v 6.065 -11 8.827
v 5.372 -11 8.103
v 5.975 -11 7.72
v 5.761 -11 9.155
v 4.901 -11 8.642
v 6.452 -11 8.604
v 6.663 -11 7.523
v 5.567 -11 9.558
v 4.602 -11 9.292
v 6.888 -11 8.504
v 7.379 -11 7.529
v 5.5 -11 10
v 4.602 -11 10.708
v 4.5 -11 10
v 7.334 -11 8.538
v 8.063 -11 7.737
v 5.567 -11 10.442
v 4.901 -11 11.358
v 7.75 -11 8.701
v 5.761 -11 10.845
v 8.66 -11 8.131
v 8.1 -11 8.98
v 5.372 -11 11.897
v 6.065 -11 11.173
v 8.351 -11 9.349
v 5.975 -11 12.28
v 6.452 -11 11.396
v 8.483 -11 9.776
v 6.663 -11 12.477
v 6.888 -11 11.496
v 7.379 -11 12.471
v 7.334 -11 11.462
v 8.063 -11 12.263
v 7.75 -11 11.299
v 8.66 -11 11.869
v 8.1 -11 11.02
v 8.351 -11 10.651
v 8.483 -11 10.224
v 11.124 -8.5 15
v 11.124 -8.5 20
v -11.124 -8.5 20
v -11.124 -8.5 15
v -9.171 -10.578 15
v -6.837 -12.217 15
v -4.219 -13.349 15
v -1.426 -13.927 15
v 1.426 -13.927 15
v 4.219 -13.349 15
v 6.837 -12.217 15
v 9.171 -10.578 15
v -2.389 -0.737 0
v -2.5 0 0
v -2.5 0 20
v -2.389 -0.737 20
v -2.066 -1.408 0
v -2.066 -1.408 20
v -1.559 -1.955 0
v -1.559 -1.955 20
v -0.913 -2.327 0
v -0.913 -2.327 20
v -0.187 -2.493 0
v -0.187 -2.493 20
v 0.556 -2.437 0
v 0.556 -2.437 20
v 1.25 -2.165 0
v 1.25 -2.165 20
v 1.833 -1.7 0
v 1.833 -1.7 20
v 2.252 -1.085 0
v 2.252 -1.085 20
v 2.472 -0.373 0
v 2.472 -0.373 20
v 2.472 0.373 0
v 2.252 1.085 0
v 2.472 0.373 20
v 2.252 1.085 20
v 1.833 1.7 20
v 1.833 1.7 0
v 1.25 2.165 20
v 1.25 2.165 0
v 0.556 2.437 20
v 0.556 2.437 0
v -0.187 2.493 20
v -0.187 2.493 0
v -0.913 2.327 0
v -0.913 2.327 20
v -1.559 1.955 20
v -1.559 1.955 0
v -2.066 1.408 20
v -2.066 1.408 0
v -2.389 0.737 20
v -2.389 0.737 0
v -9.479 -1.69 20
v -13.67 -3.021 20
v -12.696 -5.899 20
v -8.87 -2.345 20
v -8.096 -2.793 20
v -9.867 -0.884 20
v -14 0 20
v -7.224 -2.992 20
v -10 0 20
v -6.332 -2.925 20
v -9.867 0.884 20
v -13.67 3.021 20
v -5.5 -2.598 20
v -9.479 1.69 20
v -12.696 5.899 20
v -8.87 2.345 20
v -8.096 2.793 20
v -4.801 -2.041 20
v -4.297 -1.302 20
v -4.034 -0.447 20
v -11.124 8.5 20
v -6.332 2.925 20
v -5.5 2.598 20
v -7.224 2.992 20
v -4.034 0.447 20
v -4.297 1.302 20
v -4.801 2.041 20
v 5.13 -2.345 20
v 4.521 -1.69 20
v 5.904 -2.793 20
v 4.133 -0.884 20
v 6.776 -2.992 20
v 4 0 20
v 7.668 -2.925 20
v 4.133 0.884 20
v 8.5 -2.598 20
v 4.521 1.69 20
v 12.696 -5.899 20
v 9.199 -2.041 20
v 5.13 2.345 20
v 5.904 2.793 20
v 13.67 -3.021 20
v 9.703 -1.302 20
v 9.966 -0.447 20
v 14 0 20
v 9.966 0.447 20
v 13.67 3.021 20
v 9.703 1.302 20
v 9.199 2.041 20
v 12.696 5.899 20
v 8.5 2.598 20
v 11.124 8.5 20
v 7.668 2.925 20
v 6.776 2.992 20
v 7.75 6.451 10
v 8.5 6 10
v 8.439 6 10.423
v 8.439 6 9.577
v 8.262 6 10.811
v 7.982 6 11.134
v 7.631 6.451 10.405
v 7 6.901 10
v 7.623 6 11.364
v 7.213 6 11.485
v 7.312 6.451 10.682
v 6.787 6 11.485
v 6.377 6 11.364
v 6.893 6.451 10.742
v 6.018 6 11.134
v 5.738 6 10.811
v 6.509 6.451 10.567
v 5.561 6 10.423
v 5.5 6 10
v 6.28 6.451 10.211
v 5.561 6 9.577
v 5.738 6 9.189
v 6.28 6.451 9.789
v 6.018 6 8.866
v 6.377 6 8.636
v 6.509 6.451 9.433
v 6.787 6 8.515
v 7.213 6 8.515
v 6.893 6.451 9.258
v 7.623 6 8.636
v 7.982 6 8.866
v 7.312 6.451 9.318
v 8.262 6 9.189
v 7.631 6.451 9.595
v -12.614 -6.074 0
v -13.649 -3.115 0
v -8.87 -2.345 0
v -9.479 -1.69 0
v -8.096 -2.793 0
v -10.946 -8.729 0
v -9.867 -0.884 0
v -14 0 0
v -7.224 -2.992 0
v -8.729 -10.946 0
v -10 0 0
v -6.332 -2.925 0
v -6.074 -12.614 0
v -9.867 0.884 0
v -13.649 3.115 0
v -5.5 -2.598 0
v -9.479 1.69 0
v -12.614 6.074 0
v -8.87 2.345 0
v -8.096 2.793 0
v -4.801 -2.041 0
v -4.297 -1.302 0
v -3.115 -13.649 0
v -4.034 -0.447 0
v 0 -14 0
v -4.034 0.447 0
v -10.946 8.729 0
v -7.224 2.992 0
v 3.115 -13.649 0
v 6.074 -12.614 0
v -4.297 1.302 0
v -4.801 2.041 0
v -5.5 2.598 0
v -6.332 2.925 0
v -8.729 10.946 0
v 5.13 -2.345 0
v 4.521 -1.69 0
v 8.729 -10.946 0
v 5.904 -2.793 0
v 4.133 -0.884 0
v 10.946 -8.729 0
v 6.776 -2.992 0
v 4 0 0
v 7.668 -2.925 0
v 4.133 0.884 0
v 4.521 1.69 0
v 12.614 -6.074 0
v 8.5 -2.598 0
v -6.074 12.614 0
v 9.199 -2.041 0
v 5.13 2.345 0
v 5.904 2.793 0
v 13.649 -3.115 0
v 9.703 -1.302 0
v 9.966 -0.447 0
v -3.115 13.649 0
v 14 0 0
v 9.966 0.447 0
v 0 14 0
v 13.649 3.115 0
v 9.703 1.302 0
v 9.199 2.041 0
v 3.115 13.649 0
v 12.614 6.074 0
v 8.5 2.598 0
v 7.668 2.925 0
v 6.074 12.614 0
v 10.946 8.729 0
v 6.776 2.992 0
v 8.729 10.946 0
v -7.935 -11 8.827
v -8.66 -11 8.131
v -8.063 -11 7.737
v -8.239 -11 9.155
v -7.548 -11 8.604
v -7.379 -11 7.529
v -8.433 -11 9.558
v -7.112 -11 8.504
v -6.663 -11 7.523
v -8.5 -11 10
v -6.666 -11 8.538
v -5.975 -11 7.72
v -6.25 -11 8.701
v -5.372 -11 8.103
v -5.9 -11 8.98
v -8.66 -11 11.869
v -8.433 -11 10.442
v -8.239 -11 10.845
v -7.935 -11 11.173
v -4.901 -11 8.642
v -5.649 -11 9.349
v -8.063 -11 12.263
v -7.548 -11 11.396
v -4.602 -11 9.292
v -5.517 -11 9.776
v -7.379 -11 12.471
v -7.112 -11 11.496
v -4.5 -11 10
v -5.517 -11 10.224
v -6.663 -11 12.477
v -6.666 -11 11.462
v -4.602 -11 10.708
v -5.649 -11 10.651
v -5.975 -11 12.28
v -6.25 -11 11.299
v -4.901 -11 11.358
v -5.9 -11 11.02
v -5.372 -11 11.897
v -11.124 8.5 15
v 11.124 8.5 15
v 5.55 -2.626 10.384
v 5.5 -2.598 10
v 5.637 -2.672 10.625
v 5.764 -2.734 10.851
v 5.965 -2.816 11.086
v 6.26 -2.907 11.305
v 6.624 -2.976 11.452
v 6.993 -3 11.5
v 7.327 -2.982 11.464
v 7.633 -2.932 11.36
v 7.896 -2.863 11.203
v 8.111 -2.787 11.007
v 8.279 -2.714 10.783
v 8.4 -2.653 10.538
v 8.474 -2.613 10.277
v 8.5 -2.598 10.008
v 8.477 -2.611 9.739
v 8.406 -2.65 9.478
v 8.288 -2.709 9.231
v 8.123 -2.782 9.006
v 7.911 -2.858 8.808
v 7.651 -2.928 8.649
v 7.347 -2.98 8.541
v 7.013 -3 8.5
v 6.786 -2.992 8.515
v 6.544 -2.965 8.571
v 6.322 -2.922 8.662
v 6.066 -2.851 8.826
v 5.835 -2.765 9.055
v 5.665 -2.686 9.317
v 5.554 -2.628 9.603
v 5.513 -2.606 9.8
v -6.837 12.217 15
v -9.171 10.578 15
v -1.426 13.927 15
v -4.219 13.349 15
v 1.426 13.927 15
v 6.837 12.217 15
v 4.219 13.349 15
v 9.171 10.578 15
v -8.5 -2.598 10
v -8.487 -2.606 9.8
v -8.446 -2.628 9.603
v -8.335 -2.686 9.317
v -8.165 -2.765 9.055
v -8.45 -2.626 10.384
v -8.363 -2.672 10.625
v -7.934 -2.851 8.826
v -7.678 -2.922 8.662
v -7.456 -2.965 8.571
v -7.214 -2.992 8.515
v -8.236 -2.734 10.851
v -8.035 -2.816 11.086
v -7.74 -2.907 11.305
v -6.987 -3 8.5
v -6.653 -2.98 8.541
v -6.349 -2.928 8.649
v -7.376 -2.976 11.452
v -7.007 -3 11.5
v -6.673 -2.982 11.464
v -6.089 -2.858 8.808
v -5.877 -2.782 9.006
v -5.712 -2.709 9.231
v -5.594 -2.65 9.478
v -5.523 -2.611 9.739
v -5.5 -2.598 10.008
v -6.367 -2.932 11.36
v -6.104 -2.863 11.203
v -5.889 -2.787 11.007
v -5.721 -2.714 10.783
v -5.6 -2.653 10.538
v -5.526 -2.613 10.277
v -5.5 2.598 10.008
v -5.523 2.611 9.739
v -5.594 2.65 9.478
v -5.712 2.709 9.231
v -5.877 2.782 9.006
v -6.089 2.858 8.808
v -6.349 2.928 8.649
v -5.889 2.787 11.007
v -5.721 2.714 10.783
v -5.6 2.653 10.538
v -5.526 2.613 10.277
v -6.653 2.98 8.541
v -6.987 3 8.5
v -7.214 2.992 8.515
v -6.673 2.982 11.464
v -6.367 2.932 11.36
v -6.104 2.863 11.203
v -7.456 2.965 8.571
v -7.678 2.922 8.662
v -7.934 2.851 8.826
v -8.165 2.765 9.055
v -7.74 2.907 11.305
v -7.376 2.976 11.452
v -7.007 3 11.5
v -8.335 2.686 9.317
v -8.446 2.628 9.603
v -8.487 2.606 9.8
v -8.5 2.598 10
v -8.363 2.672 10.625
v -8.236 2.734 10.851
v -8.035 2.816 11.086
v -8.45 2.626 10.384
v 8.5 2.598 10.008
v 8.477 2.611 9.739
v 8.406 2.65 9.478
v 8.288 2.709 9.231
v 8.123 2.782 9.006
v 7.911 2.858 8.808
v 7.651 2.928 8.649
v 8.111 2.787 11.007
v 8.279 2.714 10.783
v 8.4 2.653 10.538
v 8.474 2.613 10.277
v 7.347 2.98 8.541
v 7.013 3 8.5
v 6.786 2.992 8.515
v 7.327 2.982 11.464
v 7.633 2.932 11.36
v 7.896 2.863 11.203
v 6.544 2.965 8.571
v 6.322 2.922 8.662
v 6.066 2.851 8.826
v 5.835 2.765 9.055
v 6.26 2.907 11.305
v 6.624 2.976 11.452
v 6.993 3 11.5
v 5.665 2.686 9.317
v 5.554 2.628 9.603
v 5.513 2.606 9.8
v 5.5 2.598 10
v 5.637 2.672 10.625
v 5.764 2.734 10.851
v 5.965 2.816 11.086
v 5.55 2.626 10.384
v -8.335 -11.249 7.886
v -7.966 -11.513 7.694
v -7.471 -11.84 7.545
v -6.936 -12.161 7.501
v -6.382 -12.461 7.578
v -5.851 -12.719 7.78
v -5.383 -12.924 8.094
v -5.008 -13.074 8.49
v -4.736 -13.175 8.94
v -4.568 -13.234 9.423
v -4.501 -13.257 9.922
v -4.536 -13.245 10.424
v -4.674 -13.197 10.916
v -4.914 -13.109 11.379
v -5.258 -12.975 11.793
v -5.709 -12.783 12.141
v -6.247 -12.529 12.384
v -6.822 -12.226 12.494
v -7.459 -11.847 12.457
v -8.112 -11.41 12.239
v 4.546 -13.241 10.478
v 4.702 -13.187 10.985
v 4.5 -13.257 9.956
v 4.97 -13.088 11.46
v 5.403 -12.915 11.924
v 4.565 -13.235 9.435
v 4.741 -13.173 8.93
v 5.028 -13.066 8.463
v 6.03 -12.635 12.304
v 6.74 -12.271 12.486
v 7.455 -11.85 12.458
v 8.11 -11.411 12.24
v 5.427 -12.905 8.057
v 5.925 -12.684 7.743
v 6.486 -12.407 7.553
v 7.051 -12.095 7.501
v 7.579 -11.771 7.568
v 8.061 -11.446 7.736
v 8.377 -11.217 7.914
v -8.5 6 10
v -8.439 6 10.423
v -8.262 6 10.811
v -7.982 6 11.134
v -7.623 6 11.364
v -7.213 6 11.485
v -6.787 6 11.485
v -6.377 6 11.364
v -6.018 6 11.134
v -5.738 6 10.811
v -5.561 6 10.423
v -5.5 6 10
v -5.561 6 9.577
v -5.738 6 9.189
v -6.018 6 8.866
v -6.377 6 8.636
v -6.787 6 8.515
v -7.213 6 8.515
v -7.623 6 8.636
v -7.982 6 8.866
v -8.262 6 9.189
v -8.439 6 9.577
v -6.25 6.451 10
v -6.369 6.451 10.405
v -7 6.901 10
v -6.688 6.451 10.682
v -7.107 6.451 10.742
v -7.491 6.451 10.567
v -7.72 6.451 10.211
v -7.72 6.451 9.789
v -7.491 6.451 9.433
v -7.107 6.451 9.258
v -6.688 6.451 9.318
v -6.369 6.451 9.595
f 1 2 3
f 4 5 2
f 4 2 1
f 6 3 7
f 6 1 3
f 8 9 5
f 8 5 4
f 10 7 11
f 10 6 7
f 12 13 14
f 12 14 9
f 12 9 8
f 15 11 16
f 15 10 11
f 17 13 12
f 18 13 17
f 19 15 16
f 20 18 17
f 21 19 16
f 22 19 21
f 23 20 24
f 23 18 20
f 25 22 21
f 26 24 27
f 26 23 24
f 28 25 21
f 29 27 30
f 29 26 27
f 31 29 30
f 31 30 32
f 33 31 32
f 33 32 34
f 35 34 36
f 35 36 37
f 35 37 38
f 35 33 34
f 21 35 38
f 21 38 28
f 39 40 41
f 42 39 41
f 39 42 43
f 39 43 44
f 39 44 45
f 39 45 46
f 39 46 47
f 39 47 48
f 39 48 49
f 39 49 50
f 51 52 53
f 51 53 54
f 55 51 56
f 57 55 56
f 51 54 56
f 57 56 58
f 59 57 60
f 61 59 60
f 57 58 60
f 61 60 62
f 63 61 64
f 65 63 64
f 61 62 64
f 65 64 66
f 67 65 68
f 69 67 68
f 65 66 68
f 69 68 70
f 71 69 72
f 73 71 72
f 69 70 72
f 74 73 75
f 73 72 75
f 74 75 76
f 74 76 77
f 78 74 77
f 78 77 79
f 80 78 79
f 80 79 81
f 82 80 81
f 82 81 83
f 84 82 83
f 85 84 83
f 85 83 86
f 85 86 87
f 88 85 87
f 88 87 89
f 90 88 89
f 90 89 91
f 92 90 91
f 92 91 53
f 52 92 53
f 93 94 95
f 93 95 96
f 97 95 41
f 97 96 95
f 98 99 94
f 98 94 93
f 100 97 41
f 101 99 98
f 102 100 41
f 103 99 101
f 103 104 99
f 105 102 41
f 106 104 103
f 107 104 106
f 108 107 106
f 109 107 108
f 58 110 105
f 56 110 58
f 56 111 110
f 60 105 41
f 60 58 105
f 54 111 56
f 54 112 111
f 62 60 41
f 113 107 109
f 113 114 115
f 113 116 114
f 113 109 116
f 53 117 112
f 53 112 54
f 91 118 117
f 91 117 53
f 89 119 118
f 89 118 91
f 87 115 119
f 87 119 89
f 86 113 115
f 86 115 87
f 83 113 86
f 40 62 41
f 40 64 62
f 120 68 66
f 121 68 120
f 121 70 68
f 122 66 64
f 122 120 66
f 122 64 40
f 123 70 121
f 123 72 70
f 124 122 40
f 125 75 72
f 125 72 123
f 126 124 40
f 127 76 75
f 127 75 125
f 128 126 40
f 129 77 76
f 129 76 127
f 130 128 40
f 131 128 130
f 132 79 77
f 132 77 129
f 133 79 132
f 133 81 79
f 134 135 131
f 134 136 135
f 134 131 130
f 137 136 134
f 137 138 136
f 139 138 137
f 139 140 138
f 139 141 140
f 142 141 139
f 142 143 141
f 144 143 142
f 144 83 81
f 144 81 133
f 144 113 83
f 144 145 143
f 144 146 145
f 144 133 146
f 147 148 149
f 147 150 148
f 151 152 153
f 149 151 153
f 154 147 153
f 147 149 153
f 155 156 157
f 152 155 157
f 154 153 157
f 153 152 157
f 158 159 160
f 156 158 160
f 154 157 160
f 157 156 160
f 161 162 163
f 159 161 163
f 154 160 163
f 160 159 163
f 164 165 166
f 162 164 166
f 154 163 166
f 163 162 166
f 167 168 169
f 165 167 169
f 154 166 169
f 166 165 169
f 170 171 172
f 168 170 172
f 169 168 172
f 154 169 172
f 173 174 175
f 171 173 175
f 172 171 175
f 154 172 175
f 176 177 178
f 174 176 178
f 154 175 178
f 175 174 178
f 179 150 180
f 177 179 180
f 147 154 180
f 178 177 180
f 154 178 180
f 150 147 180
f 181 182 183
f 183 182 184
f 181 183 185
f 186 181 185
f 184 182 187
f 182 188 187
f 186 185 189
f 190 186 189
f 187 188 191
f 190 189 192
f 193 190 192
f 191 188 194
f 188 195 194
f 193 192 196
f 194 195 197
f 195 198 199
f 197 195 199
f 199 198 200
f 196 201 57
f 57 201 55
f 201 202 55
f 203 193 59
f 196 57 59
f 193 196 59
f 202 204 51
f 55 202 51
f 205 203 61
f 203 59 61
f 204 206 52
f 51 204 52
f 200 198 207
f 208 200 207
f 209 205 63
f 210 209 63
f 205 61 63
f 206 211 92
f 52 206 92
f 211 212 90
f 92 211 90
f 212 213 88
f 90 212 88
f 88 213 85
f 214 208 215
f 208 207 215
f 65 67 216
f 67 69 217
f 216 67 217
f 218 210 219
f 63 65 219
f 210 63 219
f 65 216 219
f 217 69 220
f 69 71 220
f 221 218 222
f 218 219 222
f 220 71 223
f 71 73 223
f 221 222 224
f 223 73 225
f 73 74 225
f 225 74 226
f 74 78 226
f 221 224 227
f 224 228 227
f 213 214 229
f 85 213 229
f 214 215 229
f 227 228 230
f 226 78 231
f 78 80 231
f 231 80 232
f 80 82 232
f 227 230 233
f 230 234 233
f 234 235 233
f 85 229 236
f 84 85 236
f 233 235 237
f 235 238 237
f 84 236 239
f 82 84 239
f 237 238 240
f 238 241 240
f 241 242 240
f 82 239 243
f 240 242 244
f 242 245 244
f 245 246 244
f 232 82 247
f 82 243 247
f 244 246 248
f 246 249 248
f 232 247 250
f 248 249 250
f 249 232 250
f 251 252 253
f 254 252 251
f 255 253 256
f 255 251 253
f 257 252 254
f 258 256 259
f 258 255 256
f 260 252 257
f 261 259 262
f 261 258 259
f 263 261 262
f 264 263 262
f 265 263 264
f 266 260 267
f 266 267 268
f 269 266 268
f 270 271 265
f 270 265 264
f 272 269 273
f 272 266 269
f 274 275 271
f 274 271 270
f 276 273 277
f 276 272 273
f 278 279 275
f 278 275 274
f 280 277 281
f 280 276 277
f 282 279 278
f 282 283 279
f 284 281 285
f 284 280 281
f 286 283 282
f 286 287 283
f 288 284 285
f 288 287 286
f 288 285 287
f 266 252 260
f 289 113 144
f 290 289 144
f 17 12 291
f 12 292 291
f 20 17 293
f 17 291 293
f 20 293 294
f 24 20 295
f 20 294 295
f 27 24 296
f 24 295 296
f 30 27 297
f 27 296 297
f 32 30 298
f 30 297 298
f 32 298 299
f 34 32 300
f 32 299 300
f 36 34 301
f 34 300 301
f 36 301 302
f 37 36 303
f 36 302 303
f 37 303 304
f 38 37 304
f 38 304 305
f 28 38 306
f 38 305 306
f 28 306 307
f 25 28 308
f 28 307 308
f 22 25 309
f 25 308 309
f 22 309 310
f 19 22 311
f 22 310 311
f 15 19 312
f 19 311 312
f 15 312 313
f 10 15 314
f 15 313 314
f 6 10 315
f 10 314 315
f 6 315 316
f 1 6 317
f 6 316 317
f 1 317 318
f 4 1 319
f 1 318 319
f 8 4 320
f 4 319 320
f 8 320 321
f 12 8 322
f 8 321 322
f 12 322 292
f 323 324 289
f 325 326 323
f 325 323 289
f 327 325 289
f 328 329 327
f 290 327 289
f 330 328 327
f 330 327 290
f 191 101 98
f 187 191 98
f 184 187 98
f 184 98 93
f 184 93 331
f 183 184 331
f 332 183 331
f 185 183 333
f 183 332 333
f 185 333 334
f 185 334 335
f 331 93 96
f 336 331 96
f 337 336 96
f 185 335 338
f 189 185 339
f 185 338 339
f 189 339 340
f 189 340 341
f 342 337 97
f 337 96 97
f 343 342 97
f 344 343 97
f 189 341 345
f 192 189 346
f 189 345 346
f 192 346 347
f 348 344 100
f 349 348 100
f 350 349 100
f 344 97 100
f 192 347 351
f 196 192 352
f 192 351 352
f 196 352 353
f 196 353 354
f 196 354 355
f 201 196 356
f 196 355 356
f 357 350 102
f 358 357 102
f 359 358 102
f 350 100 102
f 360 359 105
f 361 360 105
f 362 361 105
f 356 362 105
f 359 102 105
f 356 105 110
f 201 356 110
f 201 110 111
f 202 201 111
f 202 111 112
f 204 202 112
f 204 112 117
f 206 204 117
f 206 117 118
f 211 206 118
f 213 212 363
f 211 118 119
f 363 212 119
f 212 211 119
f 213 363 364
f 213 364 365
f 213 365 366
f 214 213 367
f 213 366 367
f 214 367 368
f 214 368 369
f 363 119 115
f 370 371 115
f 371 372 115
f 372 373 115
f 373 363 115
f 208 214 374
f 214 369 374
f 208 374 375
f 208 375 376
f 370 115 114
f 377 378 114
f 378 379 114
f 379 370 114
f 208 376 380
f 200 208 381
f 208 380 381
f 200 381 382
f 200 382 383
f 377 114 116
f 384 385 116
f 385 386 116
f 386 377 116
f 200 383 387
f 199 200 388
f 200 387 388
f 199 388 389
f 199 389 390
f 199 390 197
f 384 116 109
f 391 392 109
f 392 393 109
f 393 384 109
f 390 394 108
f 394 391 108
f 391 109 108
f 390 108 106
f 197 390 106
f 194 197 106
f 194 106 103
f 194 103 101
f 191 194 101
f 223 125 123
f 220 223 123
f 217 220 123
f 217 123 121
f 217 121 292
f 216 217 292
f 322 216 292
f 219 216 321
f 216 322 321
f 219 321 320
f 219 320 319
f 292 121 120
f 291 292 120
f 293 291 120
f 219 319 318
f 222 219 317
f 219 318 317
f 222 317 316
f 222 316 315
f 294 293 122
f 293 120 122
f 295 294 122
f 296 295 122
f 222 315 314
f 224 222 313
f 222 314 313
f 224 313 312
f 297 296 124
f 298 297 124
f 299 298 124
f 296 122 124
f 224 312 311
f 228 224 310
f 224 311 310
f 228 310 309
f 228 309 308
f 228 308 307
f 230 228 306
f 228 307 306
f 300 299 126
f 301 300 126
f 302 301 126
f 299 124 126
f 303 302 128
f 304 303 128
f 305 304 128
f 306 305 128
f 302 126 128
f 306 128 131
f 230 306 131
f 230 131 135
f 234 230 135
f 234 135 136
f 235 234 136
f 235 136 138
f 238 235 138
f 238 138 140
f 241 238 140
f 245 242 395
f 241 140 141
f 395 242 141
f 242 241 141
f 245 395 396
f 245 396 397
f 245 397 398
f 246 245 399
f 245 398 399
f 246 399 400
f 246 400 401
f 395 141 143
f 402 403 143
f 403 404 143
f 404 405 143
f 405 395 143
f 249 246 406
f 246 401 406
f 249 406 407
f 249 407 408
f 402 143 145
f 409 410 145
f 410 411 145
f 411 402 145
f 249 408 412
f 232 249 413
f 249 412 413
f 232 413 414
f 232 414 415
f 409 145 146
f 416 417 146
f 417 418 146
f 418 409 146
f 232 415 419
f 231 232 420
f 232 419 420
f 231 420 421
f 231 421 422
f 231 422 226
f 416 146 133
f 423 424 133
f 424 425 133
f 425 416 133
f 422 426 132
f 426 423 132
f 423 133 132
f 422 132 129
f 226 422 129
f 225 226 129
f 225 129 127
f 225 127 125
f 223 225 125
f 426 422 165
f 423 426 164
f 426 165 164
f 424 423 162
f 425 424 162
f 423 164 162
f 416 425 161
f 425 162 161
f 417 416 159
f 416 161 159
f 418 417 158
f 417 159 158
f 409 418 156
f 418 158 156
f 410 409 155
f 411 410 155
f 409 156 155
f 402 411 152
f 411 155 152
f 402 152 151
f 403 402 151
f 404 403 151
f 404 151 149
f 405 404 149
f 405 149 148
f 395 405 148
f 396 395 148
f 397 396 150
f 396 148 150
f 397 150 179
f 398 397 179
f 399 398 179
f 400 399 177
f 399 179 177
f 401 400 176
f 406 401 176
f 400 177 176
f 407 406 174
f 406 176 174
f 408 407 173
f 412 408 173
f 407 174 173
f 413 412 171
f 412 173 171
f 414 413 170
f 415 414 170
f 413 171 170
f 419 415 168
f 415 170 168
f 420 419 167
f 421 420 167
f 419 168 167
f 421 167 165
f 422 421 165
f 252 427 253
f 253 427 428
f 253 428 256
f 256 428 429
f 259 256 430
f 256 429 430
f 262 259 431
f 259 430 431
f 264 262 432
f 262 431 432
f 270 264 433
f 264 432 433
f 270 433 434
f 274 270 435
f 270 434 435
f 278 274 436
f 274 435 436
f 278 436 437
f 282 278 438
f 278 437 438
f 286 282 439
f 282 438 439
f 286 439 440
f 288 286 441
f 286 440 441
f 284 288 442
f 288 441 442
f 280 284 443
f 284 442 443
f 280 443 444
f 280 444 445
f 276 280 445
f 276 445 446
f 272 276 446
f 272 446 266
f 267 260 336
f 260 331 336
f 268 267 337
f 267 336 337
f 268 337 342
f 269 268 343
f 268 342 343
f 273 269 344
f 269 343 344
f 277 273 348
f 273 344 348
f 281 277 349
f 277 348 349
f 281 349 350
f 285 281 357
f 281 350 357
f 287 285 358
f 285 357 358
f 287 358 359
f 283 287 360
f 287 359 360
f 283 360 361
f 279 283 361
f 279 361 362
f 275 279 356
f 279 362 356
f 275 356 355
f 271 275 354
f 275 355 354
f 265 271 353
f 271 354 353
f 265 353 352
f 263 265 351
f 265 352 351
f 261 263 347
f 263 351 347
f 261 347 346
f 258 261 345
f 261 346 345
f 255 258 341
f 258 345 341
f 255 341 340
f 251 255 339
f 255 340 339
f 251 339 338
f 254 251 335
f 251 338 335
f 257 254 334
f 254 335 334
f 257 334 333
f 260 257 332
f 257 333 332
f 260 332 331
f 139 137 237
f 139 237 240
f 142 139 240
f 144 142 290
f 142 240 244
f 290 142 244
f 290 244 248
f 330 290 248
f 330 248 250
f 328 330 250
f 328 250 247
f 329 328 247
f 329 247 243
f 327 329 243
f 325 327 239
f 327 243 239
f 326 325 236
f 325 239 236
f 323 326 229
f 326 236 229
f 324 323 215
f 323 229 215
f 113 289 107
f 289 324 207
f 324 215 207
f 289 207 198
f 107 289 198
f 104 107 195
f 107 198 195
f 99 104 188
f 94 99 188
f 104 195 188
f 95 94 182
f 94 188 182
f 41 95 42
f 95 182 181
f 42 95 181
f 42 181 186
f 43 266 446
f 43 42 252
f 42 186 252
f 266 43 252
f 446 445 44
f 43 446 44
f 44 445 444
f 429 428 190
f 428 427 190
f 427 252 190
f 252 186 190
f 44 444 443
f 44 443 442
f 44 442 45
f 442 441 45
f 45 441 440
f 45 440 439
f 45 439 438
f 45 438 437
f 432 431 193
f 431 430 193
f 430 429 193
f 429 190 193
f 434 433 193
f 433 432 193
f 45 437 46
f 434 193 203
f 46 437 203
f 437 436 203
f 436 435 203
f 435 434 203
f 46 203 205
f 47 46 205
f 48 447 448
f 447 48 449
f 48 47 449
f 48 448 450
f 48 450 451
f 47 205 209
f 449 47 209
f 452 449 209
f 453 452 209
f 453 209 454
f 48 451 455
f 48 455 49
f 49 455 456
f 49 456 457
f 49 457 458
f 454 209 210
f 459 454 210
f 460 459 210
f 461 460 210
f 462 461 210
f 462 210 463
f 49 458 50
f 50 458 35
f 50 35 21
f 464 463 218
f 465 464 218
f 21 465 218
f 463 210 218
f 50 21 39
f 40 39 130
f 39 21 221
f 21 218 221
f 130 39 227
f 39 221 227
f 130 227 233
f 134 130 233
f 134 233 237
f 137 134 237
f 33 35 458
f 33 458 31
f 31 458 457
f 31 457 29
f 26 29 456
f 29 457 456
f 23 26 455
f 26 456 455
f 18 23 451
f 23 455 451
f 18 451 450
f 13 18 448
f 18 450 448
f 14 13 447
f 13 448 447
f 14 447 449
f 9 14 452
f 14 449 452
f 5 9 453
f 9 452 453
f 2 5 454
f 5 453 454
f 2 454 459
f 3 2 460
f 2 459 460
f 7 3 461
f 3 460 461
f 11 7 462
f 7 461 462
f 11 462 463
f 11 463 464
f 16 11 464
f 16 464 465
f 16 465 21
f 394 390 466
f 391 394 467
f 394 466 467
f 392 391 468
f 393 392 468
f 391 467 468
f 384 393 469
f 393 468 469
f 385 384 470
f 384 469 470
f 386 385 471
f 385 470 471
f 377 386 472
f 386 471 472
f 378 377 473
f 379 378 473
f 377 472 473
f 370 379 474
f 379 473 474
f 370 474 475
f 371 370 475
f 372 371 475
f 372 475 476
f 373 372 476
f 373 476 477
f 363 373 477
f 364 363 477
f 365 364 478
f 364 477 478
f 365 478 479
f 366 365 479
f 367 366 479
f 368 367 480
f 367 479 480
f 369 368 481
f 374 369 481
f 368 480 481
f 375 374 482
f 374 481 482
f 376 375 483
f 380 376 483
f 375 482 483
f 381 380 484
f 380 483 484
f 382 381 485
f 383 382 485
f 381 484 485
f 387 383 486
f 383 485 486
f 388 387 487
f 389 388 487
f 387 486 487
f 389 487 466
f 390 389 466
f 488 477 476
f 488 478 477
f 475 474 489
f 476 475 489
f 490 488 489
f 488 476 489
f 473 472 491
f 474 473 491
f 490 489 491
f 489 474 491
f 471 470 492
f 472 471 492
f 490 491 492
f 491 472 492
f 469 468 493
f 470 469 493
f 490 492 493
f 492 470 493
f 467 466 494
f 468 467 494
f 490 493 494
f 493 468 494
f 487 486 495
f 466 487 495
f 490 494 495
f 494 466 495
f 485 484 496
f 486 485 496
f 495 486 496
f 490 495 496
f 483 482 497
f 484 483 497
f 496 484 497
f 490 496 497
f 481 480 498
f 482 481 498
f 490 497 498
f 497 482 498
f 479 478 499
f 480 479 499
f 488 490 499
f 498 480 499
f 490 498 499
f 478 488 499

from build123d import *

# Parameters (mm, degrees)
F0_R           = 14
F0_R_2         = 3
F0_R_3         = 1
F1_DEPTH       = 20
F2_D           = 6
F5_D           = 3
F5_DEPTH       = 20
F5_CBORE_D     = 5
F5_CBORE_DEPTH = 3
F5_TIP         = 0.9012909285
F7_DEPTH       = 5
F8_D           = 5


with BuildPart() as f1:
    # F0 (on Top) → F1 (new body)
    with BuildSketch(Plane.XY):
        Circle(F0_R)
        with Locations((-7, 0)):
            Circle(F0_R_2, mode=Mode.SUBTRACT)
        Circle(F0_R_2, mode=Mode.SUBTRACT)
        with Locations((0, 5)):
            Circle(F0_R_3, mode=Mode.SUBTRACT)
        with Locations((7, 0)):
            Circle(F0_R_2, mode=Mode.SUBTRACT)
        with Locations((-7, 0)):
            Circle(F0_R_2)
        Circle(F0_R_2)
        with Locations((7, 0)):
            Circle(F0_R_2)
        with Locations((0, 5)):
            Circle(F0_R_3)
    extrude(amount=F1_DEPTH)

    # F2 (through all)
    with Locations(Plane(origin=(0, 0, 0), x_dir=(1, 0, 0), z_dir=(0, 0, -1))):
        with Locations((-7, 0), (7, 0)):
            Hole(F2_D / 2)

    # F5
    with Locations(Plane.XZ.offset(14)):
        with Locations((-7, 10), (7, 10)):
            CounterBoreHole(F5_D / 2, F5_CBORE_D / 2, F5_CBORE_DEPTH, depth=F5_DEPTH)
            with Locations((0, 0, -(F5_DEPTH + F5_TIP / 2))):  # 118° drill point
                Cone(0, F5_D / 2, F5_TIP, mode=Mode.SUBTRACT)

    # F6 (on face) → F7 (cut)
    with BuildSketch(Plane.XY.offset(20)):
        with BuildLine():
            Line((-11.1242977306, 8.5), (11.1242977306, 8.5))
            ThreePointArc((11.1242977306, 8.5), (0, 14), (-11.1242977306, 8.5))
        make_face()
        with BuildLine():
            ThreePointArc((-11.1242977306, -8.5), (0, -14), (11.1242977306, -8.5))
            Line((11.1242977306, -8.5), (-11.1242977306, -8.5))
        make_face()
    extrude(amount=-F7_DEPTH, mode=Mode.SUBTRACT)

    # F8 (through all)
    with Locations(Plane(origin=(0, 0, 0), x_dir=(1, 0, 0), z_dir=(0, 0, -1))):
        with Locations((0, 0)):
            Hole(F8_D / 2)


solid = f1.part
